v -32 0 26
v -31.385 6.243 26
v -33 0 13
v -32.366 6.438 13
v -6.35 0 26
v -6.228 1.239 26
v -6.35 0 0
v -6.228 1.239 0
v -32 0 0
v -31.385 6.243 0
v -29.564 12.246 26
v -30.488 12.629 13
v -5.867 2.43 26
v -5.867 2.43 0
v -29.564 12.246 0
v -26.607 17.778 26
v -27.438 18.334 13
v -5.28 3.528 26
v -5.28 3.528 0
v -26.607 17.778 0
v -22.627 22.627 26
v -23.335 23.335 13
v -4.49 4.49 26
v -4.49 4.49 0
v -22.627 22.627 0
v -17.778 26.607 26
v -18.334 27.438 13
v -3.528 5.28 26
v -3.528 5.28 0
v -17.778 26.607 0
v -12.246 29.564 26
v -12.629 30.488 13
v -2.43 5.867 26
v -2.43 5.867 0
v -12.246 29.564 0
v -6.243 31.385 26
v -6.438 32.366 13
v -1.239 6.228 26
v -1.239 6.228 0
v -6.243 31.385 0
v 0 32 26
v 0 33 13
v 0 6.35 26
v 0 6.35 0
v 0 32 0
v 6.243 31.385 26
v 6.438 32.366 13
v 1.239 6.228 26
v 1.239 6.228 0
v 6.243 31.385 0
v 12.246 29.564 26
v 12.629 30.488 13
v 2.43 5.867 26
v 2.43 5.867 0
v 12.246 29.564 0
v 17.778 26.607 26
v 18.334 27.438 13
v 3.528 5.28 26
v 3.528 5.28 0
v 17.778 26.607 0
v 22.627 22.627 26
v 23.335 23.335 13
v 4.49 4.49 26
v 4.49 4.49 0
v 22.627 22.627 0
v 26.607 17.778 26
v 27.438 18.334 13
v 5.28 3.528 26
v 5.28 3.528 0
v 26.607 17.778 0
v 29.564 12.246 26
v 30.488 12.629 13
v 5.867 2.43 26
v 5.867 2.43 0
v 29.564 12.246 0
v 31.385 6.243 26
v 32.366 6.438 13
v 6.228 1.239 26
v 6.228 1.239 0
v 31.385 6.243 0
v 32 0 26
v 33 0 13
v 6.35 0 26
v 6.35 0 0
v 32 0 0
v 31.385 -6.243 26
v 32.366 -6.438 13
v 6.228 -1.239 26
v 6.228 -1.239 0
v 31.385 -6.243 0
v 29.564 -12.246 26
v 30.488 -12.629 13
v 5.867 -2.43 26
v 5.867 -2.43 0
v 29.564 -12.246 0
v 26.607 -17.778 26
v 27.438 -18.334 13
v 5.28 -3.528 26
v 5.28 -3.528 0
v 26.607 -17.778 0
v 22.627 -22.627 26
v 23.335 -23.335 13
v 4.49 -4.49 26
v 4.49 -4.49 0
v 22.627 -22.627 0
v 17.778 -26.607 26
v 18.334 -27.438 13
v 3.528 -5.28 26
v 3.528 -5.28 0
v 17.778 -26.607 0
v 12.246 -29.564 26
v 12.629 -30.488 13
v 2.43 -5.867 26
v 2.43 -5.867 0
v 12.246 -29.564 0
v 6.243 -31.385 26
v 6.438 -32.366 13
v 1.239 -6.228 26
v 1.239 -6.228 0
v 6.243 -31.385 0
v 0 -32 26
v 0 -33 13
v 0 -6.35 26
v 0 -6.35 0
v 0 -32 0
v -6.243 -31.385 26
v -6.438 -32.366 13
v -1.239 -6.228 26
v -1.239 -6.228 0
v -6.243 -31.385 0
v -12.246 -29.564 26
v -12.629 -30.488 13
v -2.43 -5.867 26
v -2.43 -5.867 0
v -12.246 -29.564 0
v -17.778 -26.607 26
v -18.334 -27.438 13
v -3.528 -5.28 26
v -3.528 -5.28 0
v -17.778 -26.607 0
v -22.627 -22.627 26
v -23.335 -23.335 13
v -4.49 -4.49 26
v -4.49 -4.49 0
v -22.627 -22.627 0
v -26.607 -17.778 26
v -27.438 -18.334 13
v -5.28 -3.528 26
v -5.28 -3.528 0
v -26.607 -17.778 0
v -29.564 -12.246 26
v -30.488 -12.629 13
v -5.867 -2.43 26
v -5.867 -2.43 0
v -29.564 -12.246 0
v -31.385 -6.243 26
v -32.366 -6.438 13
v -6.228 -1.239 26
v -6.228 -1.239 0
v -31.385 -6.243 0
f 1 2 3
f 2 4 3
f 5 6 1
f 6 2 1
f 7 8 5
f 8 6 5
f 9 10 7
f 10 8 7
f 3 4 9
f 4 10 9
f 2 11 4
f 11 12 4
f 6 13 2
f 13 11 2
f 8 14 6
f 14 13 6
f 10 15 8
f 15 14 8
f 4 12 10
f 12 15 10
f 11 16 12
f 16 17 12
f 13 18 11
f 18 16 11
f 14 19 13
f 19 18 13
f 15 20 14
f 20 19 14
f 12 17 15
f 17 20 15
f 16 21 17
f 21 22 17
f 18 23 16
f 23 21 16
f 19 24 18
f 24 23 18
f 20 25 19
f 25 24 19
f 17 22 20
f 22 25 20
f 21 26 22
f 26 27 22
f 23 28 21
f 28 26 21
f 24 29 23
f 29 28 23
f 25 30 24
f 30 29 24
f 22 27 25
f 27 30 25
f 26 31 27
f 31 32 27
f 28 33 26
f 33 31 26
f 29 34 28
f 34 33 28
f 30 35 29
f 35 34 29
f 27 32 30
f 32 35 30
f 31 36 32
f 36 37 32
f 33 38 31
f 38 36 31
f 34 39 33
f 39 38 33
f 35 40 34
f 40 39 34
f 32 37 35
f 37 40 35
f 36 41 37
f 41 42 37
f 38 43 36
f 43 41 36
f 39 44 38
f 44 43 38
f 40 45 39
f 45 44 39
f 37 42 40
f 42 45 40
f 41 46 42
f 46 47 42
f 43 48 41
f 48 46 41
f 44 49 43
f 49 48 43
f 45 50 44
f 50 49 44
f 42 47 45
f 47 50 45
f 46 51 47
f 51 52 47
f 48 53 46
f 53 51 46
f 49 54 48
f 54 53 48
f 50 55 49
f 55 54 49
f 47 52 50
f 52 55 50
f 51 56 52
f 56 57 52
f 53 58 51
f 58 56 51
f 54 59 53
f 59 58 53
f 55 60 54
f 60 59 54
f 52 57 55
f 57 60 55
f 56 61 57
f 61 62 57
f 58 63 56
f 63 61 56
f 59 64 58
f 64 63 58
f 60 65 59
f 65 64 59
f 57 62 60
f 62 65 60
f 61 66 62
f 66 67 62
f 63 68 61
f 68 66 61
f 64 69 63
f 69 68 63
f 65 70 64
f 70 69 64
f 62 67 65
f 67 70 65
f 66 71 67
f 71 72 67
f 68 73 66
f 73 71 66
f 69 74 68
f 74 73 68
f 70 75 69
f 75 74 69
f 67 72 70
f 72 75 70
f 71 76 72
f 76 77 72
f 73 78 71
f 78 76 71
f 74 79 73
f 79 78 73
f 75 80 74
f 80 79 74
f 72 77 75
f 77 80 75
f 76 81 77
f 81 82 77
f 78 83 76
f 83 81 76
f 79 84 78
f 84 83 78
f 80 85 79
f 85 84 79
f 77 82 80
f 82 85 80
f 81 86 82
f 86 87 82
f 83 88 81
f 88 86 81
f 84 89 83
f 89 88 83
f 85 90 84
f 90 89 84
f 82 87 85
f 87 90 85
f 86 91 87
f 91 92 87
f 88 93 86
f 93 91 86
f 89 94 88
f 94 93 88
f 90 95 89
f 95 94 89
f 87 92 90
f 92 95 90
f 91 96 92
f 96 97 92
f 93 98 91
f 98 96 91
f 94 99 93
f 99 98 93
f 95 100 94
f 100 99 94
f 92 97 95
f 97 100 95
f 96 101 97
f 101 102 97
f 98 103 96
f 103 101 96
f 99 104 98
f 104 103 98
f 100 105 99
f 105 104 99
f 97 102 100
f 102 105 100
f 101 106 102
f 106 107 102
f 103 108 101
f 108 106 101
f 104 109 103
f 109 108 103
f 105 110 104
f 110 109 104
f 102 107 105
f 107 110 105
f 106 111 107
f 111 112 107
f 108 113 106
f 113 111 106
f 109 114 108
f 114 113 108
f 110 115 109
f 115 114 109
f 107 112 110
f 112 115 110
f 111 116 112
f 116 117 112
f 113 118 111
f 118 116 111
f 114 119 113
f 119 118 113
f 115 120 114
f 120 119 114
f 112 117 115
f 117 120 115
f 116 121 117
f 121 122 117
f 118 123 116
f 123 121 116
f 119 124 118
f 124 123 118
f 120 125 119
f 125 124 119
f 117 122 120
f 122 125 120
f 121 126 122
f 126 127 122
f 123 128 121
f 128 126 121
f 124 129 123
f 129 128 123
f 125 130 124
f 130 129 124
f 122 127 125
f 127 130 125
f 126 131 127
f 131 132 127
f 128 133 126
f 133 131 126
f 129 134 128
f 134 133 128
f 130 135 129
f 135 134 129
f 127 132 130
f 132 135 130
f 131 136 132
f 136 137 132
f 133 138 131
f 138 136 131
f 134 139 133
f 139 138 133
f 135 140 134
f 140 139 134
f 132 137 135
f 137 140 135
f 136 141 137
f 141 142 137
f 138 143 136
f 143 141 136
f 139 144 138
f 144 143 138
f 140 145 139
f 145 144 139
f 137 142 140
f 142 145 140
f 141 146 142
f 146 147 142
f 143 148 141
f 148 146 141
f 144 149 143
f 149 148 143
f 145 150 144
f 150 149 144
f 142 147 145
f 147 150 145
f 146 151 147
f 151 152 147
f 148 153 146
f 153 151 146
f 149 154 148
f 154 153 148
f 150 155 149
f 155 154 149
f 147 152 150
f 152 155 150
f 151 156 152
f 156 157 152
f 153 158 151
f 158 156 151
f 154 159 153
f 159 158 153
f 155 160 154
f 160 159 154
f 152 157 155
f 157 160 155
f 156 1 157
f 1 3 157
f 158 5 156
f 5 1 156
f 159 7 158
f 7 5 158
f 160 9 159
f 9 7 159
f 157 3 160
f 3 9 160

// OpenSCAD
$fn = 32;

// ----------------------------------------------------------------------
// Belt roller: 64 mm barrel, 26 mm wide, bore 12.7 mm
// ----------------------------------------------------------------------

// --- parameters (mm) ---
bore_d = 12.7;            // bore
barrel_d = 64;            // barrel diameter
roller_w = 26;            // roller width
crown = 1;                // crown height at mid width

roller_profile = [[6.35, 0], [32, 0], [33, 13], [32, 26], [6.35, 26]];

/* the profile stays clear of the axis, so the bore comes out of the revolve */
rotate_extrude() polygon(roller_profile);
